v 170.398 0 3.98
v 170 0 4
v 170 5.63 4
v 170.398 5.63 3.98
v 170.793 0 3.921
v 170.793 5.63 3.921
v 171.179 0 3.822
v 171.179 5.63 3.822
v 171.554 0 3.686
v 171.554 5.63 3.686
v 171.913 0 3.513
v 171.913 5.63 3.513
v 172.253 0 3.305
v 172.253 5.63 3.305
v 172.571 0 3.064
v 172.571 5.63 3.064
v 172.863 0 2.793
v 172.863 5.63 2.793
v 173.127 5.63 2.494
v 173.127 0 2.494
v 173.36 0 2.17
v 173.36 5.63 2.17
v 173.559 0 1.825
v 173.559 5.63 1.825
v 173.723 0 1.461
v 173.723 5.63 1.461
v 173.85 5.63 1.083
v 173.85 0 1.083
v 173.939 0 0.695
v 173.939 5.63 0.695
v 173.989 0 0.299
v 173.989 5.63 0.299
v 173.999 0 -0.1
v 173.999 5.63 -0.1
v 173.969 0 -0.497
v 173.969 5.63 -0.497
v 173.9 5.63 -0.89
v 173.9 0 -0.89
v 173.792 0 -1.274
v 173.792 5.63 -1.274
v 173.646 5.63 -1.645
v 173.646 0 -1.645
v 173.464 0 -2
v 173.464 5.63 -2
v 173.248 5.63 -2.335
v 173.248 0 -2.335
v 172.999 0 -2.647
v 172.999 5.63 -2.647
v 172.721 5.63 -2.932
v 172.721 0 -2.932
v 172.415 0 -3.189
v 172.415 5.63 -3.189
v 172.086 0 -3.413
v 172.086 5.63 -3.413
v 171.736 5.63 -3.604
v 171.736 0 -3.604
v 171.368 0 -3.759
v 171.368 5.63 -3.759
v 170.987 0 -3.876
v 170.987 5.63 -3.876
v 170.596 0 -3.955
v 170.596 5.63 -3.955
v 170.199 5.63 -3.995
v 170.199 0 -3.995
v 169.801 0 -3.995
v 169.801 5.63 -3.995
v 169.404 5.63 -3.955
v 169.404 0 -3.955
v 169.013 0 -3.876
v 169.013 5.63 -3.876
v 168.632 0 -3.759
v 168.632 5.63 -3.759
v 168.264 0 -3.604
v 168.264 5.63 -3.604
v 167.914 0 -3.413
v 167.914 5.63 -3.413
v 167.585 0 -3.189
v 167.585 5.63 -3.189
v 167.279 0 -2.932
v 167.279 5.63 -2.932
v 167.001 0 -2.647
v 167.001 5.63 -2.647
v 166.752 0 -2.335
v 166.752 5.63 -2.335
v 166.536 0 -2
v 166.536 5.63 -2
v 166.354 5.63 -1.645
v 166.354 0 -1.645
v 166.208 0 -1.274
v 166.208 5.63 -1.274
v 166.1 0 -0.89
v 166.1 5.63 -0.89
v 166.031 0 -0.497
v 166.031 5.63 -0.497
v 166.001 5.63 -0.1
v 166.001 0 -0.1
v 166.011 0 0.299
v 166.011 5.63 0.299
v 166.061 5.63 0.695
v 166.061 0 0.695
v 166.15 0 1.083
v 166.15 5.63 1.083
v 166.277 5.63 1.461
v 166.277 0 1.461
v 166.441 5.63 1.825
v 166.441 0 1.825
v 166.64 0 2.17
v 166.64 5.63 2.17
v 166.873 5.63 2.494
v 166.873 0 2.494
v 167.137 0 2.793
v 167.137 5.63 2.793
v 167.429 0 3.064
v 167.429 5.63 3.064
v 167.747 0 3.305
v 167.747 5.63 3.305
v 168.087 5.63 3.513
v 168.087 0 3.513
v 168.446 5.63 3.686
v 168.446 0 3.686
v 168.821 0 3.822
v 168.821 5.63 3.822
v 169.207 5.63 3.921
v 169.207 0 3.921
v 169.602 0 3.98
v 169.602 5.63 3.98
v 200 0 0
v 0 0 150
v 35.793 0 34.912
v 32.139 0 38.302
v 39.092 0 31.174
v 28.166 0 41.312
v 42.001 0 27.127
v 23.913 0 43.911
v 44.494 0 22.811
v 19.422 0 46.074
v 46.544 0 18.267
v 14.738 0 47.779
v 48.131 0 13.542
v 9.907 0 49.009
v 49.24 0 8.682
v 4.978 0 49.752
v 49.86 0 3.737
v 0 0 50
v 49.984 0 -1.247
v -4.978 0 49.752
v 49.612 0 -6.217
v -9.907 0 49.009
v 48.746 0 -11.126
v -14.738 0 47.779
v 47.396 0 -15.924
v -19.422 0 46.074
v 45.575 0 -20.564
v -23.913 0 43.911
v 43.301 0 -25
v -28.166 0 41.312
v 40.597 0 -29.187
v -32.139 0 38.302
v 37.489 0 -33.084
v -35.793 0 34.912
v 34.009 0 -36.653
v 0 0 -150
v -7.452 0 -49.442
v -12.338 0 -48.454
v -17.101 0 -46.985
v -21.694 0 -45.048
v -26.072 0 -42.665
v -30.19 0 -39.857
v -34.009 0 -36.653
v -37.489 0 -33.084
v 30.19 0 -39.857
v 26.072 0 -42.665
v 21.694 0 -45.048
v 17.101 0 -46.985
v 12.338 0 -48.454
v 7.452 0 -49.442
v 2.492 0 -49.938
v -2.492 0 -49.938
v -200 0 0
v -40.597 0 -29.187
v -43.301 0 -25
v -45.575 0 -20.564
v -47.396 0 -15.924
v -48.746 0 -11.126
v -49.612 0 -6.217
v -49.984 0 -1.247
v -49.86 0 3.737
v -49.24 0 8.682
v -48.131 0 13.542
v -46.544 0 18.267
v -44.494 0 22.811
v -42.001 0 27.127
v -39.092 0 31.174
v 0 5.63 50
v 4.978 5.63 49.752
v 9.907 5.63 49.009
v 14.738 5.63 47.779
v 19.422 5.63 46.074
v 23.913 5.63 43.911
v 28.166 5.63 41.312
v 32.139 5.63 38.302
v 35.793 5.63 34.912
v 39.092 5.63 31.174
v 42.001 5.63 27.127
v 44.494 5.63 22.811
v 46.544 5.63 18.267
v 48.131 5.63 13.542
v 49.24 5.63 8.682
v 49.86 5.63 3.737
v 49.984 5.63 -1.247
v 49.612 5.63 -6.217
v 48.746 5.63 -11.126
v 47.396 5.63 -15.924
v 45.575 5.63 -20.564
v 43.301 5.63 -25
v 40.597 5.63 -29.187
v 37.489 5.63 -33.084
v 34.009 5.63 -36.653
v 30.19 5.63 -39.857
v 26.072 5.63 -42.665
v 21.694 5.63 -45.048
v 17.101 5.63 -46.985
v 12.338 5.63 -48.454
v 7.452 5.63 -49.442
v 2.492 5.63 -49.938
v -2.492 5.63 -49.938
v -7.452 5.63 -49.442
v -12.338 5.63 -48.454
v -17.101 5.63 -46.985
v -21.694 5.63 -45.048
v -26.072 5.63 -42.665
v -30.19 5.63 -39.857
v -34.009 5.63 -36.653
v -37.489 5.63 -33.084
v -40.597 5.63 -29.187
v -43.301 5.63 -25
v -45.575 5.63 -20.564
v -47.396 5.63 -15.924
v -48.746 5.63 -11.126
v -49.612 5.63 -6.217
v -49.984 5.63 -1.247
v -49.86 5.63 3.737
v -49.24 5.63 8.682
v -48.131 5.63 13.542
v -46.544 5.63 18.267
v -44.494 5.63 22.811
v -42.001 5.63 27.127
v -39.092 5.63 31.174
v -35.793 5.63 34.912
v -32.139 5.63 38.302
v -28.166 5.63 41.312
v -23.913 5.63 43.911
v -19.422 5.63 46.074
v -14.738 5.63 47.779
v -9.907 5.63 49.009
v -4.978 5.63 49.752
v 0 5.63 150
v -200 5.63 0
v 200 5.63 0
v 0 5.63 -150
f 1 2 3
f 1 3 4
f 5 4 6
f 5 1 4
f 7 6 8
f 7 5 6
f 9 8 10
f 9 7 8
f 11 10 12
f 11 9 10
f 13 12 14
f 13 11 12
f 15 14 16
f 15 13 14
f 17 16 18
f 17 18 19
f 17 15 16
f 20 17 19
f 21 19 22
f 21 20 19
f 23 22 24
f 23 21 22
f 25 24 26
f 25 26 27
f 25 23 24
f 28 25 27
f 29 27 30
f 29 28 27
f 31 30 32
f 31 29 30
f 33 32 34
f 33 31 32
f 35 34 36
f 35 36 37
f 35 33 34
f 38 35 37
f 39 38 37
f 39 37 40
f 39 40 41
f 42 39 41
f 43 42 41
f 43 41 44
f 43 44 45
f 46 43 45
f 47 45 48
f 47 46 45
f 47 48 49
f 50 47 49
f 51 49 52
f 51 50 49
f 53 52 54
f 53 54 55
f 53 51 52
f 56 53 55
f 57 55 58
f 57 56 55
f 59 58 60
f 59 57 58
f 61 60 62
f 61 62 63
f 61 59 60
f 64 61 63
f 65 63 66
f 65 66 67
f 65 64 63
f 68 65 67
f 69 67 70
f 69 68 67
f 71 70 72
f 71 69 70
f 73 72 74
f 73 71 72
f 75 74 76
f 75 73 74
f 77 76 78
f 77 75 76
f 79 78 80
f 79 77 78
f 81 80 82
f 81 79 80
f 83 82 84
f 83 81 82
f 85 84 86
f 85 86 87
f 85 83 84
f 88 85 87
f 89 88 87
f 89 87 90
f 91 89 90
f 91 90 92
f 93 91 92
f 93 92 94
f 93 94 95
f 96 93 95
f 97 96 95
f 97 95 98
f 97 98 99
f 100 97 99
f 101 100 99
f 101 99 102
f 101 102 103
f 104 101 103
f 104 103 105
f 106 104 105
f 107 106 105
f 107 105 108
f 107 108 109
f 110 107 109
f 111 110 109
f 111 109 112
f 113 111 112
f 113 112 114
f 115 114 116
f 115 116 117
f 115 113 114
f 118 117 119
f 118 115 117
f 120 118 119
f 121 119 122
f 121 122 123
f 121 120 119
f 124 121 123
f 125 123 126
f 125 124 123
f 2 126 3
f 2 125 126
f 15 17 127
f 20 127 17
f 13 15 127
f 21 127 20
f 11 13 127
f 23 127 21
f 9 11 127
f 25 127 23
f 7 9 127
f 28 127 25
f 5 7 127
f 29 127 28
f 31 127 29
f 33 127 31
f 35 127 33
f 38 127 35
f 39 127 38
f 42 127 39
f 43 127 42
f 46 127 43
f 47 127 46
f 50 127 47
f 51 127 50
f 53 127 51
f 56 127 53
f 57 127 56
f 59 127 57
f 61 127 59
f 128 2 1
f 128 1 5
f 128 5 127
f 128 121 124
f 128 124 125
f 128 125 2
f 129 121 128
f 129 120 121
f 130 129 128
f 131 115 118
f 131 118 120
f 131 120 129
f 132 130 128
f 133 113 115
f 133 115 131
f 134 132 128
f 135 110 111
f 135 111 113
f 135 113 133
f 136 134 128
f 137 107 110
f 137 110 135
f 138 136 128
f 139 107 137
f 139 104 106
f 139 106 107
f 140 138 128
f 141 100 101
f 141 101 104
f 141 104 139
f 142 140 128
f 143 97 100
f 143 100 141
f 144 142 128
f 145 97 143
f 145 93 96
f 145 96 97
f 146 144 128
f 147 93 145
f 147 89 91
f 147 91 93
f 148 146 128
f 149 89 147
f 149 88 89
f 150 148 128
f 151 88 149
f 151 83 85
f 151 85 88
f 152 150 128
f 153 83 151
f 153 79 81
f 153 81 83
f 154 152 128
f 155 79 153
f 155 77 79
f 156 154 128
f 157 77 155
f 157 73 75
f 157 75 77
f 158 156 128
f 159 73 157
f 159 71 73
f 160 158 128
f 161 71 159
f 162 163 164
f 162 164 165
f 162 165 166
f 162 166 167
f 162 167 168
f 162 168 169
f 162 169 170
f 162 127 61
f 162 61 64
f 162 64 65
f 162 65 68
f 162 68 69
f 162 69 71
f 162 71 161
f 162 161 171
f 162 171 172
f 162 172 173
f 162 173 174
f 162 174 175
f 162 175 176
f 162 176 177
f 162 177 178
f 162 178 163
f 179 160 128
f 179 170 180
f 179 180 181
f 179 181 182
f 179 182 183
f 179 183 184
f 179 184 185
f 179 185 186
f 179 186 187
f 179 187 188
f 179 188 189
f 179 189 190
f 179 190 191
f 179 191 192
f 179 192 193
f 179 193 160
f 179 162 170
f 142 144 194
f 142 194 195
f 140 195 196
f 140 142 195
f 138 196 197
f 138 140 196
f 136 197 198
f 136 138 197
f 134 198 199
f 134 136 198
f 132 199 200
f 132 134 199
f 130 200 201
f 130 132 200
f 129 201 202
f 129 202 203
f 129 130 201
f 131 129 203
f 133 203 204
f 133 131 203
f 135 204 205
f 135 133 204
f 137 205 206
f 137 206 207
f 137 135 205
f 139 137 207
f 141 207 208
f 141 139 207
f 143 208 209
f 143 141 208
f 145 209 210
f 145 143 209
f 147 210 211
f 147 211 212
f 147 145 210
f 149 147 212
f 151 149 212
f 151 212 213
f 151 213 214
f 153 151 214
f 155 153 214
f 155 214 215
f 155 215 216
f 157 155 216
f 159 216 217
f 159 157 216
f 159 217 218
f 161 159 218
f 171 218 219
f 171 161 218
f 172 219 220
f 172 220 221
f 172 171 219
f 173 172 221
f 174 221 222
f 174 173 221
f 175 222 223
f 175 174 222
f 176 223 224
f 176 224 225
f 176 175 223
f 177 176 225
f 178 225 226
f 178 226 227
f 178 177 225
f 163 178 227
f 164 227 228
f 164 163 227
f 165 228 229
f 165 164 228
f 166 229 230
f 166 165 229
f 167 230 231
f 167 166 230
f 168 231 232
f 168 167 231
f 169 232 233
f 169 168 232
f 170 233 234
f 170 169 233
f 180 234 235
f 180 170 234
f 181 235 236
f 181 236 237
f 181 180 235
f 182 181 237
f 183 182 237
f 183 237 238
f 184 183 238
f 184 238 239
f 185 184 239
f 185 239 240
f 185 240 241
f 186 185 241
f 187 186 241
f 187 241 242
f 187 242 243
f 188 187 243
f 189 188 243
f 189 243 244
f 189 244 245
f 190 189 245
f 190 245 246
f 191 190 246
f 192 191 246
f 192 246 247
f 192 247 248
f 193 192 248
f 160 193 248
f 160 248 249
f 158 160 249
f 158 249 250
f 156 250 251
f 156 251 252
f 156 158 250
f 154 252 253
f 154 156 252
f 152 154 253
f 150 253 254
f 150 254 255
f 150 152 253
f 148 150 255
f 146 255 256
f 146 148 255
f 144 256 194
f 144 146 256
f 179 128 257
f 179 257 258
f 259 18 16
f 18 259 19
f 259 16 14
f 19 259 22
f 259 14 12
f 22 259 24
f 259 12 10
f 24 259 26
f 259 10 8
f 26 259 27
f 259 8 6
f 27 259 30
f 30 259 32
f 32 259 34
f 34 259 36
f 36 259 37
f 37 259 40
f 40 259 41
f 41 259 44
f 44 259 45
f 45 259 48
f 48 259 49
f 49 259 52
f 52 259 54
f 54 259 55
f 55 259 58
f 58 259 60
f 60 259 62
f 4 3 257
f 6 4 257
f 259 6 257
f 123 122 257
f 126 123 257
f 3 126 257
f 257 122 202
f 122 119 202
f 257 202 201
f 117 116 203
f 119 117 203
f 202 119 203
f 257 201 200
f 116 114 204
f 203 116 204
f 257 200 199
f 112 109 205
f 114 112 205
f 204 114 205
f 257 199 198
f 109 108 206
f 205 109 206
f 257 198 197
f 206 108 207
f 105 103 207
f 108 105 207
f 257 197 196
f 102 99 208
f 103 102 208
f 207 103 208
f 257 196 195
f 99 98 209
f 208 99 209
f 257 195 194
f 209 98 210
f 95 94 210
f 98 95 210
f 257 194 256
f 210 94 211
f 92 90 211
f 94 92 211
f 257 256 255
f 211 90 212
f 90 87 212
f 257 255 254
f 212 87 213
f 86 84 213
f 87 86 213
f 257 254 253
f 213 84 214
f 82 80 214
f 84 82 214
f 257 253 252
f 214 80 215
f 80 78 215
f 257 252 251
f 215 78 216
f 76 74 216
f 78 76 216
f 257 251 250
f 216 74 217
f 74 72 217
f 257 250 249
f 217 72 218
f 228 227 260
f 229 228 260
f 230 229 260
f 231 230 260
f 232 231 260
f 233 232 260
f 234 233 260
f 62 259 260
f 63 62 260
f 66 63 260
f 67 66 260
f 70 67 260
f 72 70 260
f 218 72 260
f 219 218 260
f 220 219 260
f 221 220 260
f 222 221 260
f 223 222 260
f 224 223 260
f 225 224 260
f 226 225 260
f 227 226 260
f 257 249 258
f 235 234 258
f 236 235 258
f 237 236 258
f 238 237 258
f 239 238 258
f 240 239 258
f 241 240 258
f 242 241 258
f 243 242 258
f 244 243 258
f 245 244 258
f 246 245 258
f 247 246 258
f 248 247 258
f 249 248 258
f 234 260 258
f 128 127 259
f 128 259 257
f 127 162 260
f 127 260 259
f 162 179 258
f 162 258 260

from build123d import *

# Parameters (mm, degrees)
SKETCH1_R           = 50
SKETCH1_R_2         = 4
BOSS_EXTRUDE1_DEPTH = 5.63


with BuildPart() as part:
    # Sketch1 → Boss-Extrude1 (new body)
    with BuildSketch(Plane(origin=(0, 0, 0), x_dir=(1, 0, 0), z_dir=(0, 1, 0))):
        Polygon((0, 150), (200, 0), (0, -150), (-200, 0), align=None)
        with Locations(Location((0, 0, 0), (0, 0, 270))):
            Circle(SKETCH1_R, mode=Mode.SUBTRACT)
        with Locations(Location((170, 0, 0), (0, 0, 270))):
            Circle(SKETCH1_R_2, mode=Mode.SUBTRACT)
    extrude(amount=BOSS_EXTRUDE1_DEPTH)


solid = part.part
